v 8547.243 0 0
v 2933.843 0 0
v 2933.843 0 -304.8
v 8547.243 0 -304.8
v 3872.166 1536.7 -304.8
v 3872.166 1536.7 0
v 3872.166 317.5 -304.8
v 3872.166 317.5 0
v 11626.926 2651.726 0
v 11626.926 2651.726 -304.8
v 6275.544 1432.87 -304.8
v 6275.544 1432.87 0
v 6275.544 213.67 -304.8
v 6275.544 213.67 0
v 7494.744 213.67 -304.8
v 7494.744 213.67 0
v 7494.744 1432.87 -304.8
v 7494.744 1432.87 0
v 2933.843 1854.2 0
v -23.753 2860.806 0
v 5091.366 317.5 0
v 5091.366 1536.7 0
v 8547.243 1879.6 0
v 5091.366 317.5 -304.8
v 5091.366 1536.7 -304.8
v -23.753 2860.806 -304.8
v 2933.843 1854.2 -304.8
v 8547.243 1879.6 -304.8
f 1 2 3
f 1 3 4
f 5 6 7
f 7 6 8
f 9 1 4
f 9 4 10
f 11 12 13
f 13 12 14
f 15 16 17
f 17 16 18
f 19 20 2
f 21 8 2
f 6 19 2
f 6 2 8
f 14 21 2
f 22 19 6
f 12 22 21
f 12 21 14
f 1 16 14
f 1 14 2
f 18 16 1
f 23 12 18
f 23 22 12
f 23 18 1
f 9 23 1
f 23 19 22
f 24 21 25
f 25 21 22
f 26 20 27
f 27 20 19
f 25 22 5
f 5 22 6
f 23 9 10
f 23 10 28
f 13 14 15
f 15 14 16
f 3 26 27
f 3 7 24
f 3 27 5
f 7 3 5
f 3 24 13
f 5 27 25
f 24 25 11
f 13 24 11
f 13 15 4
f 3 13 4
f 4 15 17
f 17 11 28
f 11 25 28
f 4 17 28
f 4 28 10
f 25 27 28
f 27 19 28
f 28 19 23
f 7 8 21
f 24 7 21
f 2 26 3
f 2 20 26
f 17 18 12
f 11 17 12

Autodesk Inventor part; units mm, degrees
ref_plane "YZ Plane" through (0, 0, 0) normal (1, 0, 0) x (0, 1, 0)
ref_plane "XZ Plane" through (0, 0, 0) normal (0, 1, 0) x (-1, 0, 0)
ref_plane "XY Plane" through (0, 0, 0) normal (0, 0, 1) x (1, 0, 0)
sketch "Sketch1" plane through (0, 0, 0) normal (0, 0, 1) x (1, 0, 0)
  line L0 (-23.7527, 2860.8055) -> (2933.8428, 0)
  line L1 (2933.8428, 0) -> (2933.8428, 1854.2)
  line L2 (2933.8428, 0) -> (8547.2428, 0)
  line L3 (8547.2428, 0) -> (8547.2428, 1879.6)
  line L4 (2933.8428, 1854.2) -> (2933.8428, 0)
  line L5 (8547.2428, 0) -> (11626.9257, 2651.7257)
  line L6 (11626.9257, 2651.7257) -> (8547.2428, 1879.6)
  line L7 (3872.1661, 317.5) -> (5091.3661, 317.5)
  line L8 (5091.3661, 317.5) -> (5091.3661, 1536.7)
  line L9 (5091.3661, 1536.7) -> (3872.1661, 1536.7)
  line L10 (3872.1661, 1536.7) -> (3872.1661, 317.5)
  line L11 (3872.1661, 317.5) -> (5091.3661, 1536.7) construction
  line L12 (5091.3661, 317.5) -> (3872.1661, 1536.7) construction
  line L13 (-23.7527, 2860.8055) -> (2933.8428, 1854.2)
  line L14 (2933.8428, 1854.2) -> (8547.2428, 1879.6)
  line L15 (6275.5437, 213.6696) -> (7494.7437, 213.6696)
  line L16 (7494.7437, 213.6696) -> (7494.7437, 1432.8696)
  line L17 (7494.7437, 1432.8696) -> (6275.5437, 1432.8696)
  line L18 (6275.5437, 1432.8696) -> (6275.5437, 213.6696)
  line L19 (6275.5437, 213.6696) -> (7494.7437, 1432.8696) construction
  line L20 (7494.7437, 213.6696) -> (6275.5437, 1432.8696) construction
  point P0 (0, 0)
  point P1 (4481.7661, 927.1)
  point P2 (6885.1437, 823.2696)
  dimension "d2" = 5613.4
  dimension "d5" = 1219.2
  dimension "d6" = 1219.2
  dimension "d8" = 4114.8
  dimension "d11" = 1854.2
  dimension "d12" = 3124.2
  dimension "d13" = 1879.6
  dimension "d14" = 4064
  dimension "d15" = 3175
  dimension "d16" = 1219.2
  dimension "d17" = 1219.2
extrude "Extrusion1" add sketch "Sketch1" against normal blind 304.8
properties part number "unwrappedDormerEastFacingPool"
